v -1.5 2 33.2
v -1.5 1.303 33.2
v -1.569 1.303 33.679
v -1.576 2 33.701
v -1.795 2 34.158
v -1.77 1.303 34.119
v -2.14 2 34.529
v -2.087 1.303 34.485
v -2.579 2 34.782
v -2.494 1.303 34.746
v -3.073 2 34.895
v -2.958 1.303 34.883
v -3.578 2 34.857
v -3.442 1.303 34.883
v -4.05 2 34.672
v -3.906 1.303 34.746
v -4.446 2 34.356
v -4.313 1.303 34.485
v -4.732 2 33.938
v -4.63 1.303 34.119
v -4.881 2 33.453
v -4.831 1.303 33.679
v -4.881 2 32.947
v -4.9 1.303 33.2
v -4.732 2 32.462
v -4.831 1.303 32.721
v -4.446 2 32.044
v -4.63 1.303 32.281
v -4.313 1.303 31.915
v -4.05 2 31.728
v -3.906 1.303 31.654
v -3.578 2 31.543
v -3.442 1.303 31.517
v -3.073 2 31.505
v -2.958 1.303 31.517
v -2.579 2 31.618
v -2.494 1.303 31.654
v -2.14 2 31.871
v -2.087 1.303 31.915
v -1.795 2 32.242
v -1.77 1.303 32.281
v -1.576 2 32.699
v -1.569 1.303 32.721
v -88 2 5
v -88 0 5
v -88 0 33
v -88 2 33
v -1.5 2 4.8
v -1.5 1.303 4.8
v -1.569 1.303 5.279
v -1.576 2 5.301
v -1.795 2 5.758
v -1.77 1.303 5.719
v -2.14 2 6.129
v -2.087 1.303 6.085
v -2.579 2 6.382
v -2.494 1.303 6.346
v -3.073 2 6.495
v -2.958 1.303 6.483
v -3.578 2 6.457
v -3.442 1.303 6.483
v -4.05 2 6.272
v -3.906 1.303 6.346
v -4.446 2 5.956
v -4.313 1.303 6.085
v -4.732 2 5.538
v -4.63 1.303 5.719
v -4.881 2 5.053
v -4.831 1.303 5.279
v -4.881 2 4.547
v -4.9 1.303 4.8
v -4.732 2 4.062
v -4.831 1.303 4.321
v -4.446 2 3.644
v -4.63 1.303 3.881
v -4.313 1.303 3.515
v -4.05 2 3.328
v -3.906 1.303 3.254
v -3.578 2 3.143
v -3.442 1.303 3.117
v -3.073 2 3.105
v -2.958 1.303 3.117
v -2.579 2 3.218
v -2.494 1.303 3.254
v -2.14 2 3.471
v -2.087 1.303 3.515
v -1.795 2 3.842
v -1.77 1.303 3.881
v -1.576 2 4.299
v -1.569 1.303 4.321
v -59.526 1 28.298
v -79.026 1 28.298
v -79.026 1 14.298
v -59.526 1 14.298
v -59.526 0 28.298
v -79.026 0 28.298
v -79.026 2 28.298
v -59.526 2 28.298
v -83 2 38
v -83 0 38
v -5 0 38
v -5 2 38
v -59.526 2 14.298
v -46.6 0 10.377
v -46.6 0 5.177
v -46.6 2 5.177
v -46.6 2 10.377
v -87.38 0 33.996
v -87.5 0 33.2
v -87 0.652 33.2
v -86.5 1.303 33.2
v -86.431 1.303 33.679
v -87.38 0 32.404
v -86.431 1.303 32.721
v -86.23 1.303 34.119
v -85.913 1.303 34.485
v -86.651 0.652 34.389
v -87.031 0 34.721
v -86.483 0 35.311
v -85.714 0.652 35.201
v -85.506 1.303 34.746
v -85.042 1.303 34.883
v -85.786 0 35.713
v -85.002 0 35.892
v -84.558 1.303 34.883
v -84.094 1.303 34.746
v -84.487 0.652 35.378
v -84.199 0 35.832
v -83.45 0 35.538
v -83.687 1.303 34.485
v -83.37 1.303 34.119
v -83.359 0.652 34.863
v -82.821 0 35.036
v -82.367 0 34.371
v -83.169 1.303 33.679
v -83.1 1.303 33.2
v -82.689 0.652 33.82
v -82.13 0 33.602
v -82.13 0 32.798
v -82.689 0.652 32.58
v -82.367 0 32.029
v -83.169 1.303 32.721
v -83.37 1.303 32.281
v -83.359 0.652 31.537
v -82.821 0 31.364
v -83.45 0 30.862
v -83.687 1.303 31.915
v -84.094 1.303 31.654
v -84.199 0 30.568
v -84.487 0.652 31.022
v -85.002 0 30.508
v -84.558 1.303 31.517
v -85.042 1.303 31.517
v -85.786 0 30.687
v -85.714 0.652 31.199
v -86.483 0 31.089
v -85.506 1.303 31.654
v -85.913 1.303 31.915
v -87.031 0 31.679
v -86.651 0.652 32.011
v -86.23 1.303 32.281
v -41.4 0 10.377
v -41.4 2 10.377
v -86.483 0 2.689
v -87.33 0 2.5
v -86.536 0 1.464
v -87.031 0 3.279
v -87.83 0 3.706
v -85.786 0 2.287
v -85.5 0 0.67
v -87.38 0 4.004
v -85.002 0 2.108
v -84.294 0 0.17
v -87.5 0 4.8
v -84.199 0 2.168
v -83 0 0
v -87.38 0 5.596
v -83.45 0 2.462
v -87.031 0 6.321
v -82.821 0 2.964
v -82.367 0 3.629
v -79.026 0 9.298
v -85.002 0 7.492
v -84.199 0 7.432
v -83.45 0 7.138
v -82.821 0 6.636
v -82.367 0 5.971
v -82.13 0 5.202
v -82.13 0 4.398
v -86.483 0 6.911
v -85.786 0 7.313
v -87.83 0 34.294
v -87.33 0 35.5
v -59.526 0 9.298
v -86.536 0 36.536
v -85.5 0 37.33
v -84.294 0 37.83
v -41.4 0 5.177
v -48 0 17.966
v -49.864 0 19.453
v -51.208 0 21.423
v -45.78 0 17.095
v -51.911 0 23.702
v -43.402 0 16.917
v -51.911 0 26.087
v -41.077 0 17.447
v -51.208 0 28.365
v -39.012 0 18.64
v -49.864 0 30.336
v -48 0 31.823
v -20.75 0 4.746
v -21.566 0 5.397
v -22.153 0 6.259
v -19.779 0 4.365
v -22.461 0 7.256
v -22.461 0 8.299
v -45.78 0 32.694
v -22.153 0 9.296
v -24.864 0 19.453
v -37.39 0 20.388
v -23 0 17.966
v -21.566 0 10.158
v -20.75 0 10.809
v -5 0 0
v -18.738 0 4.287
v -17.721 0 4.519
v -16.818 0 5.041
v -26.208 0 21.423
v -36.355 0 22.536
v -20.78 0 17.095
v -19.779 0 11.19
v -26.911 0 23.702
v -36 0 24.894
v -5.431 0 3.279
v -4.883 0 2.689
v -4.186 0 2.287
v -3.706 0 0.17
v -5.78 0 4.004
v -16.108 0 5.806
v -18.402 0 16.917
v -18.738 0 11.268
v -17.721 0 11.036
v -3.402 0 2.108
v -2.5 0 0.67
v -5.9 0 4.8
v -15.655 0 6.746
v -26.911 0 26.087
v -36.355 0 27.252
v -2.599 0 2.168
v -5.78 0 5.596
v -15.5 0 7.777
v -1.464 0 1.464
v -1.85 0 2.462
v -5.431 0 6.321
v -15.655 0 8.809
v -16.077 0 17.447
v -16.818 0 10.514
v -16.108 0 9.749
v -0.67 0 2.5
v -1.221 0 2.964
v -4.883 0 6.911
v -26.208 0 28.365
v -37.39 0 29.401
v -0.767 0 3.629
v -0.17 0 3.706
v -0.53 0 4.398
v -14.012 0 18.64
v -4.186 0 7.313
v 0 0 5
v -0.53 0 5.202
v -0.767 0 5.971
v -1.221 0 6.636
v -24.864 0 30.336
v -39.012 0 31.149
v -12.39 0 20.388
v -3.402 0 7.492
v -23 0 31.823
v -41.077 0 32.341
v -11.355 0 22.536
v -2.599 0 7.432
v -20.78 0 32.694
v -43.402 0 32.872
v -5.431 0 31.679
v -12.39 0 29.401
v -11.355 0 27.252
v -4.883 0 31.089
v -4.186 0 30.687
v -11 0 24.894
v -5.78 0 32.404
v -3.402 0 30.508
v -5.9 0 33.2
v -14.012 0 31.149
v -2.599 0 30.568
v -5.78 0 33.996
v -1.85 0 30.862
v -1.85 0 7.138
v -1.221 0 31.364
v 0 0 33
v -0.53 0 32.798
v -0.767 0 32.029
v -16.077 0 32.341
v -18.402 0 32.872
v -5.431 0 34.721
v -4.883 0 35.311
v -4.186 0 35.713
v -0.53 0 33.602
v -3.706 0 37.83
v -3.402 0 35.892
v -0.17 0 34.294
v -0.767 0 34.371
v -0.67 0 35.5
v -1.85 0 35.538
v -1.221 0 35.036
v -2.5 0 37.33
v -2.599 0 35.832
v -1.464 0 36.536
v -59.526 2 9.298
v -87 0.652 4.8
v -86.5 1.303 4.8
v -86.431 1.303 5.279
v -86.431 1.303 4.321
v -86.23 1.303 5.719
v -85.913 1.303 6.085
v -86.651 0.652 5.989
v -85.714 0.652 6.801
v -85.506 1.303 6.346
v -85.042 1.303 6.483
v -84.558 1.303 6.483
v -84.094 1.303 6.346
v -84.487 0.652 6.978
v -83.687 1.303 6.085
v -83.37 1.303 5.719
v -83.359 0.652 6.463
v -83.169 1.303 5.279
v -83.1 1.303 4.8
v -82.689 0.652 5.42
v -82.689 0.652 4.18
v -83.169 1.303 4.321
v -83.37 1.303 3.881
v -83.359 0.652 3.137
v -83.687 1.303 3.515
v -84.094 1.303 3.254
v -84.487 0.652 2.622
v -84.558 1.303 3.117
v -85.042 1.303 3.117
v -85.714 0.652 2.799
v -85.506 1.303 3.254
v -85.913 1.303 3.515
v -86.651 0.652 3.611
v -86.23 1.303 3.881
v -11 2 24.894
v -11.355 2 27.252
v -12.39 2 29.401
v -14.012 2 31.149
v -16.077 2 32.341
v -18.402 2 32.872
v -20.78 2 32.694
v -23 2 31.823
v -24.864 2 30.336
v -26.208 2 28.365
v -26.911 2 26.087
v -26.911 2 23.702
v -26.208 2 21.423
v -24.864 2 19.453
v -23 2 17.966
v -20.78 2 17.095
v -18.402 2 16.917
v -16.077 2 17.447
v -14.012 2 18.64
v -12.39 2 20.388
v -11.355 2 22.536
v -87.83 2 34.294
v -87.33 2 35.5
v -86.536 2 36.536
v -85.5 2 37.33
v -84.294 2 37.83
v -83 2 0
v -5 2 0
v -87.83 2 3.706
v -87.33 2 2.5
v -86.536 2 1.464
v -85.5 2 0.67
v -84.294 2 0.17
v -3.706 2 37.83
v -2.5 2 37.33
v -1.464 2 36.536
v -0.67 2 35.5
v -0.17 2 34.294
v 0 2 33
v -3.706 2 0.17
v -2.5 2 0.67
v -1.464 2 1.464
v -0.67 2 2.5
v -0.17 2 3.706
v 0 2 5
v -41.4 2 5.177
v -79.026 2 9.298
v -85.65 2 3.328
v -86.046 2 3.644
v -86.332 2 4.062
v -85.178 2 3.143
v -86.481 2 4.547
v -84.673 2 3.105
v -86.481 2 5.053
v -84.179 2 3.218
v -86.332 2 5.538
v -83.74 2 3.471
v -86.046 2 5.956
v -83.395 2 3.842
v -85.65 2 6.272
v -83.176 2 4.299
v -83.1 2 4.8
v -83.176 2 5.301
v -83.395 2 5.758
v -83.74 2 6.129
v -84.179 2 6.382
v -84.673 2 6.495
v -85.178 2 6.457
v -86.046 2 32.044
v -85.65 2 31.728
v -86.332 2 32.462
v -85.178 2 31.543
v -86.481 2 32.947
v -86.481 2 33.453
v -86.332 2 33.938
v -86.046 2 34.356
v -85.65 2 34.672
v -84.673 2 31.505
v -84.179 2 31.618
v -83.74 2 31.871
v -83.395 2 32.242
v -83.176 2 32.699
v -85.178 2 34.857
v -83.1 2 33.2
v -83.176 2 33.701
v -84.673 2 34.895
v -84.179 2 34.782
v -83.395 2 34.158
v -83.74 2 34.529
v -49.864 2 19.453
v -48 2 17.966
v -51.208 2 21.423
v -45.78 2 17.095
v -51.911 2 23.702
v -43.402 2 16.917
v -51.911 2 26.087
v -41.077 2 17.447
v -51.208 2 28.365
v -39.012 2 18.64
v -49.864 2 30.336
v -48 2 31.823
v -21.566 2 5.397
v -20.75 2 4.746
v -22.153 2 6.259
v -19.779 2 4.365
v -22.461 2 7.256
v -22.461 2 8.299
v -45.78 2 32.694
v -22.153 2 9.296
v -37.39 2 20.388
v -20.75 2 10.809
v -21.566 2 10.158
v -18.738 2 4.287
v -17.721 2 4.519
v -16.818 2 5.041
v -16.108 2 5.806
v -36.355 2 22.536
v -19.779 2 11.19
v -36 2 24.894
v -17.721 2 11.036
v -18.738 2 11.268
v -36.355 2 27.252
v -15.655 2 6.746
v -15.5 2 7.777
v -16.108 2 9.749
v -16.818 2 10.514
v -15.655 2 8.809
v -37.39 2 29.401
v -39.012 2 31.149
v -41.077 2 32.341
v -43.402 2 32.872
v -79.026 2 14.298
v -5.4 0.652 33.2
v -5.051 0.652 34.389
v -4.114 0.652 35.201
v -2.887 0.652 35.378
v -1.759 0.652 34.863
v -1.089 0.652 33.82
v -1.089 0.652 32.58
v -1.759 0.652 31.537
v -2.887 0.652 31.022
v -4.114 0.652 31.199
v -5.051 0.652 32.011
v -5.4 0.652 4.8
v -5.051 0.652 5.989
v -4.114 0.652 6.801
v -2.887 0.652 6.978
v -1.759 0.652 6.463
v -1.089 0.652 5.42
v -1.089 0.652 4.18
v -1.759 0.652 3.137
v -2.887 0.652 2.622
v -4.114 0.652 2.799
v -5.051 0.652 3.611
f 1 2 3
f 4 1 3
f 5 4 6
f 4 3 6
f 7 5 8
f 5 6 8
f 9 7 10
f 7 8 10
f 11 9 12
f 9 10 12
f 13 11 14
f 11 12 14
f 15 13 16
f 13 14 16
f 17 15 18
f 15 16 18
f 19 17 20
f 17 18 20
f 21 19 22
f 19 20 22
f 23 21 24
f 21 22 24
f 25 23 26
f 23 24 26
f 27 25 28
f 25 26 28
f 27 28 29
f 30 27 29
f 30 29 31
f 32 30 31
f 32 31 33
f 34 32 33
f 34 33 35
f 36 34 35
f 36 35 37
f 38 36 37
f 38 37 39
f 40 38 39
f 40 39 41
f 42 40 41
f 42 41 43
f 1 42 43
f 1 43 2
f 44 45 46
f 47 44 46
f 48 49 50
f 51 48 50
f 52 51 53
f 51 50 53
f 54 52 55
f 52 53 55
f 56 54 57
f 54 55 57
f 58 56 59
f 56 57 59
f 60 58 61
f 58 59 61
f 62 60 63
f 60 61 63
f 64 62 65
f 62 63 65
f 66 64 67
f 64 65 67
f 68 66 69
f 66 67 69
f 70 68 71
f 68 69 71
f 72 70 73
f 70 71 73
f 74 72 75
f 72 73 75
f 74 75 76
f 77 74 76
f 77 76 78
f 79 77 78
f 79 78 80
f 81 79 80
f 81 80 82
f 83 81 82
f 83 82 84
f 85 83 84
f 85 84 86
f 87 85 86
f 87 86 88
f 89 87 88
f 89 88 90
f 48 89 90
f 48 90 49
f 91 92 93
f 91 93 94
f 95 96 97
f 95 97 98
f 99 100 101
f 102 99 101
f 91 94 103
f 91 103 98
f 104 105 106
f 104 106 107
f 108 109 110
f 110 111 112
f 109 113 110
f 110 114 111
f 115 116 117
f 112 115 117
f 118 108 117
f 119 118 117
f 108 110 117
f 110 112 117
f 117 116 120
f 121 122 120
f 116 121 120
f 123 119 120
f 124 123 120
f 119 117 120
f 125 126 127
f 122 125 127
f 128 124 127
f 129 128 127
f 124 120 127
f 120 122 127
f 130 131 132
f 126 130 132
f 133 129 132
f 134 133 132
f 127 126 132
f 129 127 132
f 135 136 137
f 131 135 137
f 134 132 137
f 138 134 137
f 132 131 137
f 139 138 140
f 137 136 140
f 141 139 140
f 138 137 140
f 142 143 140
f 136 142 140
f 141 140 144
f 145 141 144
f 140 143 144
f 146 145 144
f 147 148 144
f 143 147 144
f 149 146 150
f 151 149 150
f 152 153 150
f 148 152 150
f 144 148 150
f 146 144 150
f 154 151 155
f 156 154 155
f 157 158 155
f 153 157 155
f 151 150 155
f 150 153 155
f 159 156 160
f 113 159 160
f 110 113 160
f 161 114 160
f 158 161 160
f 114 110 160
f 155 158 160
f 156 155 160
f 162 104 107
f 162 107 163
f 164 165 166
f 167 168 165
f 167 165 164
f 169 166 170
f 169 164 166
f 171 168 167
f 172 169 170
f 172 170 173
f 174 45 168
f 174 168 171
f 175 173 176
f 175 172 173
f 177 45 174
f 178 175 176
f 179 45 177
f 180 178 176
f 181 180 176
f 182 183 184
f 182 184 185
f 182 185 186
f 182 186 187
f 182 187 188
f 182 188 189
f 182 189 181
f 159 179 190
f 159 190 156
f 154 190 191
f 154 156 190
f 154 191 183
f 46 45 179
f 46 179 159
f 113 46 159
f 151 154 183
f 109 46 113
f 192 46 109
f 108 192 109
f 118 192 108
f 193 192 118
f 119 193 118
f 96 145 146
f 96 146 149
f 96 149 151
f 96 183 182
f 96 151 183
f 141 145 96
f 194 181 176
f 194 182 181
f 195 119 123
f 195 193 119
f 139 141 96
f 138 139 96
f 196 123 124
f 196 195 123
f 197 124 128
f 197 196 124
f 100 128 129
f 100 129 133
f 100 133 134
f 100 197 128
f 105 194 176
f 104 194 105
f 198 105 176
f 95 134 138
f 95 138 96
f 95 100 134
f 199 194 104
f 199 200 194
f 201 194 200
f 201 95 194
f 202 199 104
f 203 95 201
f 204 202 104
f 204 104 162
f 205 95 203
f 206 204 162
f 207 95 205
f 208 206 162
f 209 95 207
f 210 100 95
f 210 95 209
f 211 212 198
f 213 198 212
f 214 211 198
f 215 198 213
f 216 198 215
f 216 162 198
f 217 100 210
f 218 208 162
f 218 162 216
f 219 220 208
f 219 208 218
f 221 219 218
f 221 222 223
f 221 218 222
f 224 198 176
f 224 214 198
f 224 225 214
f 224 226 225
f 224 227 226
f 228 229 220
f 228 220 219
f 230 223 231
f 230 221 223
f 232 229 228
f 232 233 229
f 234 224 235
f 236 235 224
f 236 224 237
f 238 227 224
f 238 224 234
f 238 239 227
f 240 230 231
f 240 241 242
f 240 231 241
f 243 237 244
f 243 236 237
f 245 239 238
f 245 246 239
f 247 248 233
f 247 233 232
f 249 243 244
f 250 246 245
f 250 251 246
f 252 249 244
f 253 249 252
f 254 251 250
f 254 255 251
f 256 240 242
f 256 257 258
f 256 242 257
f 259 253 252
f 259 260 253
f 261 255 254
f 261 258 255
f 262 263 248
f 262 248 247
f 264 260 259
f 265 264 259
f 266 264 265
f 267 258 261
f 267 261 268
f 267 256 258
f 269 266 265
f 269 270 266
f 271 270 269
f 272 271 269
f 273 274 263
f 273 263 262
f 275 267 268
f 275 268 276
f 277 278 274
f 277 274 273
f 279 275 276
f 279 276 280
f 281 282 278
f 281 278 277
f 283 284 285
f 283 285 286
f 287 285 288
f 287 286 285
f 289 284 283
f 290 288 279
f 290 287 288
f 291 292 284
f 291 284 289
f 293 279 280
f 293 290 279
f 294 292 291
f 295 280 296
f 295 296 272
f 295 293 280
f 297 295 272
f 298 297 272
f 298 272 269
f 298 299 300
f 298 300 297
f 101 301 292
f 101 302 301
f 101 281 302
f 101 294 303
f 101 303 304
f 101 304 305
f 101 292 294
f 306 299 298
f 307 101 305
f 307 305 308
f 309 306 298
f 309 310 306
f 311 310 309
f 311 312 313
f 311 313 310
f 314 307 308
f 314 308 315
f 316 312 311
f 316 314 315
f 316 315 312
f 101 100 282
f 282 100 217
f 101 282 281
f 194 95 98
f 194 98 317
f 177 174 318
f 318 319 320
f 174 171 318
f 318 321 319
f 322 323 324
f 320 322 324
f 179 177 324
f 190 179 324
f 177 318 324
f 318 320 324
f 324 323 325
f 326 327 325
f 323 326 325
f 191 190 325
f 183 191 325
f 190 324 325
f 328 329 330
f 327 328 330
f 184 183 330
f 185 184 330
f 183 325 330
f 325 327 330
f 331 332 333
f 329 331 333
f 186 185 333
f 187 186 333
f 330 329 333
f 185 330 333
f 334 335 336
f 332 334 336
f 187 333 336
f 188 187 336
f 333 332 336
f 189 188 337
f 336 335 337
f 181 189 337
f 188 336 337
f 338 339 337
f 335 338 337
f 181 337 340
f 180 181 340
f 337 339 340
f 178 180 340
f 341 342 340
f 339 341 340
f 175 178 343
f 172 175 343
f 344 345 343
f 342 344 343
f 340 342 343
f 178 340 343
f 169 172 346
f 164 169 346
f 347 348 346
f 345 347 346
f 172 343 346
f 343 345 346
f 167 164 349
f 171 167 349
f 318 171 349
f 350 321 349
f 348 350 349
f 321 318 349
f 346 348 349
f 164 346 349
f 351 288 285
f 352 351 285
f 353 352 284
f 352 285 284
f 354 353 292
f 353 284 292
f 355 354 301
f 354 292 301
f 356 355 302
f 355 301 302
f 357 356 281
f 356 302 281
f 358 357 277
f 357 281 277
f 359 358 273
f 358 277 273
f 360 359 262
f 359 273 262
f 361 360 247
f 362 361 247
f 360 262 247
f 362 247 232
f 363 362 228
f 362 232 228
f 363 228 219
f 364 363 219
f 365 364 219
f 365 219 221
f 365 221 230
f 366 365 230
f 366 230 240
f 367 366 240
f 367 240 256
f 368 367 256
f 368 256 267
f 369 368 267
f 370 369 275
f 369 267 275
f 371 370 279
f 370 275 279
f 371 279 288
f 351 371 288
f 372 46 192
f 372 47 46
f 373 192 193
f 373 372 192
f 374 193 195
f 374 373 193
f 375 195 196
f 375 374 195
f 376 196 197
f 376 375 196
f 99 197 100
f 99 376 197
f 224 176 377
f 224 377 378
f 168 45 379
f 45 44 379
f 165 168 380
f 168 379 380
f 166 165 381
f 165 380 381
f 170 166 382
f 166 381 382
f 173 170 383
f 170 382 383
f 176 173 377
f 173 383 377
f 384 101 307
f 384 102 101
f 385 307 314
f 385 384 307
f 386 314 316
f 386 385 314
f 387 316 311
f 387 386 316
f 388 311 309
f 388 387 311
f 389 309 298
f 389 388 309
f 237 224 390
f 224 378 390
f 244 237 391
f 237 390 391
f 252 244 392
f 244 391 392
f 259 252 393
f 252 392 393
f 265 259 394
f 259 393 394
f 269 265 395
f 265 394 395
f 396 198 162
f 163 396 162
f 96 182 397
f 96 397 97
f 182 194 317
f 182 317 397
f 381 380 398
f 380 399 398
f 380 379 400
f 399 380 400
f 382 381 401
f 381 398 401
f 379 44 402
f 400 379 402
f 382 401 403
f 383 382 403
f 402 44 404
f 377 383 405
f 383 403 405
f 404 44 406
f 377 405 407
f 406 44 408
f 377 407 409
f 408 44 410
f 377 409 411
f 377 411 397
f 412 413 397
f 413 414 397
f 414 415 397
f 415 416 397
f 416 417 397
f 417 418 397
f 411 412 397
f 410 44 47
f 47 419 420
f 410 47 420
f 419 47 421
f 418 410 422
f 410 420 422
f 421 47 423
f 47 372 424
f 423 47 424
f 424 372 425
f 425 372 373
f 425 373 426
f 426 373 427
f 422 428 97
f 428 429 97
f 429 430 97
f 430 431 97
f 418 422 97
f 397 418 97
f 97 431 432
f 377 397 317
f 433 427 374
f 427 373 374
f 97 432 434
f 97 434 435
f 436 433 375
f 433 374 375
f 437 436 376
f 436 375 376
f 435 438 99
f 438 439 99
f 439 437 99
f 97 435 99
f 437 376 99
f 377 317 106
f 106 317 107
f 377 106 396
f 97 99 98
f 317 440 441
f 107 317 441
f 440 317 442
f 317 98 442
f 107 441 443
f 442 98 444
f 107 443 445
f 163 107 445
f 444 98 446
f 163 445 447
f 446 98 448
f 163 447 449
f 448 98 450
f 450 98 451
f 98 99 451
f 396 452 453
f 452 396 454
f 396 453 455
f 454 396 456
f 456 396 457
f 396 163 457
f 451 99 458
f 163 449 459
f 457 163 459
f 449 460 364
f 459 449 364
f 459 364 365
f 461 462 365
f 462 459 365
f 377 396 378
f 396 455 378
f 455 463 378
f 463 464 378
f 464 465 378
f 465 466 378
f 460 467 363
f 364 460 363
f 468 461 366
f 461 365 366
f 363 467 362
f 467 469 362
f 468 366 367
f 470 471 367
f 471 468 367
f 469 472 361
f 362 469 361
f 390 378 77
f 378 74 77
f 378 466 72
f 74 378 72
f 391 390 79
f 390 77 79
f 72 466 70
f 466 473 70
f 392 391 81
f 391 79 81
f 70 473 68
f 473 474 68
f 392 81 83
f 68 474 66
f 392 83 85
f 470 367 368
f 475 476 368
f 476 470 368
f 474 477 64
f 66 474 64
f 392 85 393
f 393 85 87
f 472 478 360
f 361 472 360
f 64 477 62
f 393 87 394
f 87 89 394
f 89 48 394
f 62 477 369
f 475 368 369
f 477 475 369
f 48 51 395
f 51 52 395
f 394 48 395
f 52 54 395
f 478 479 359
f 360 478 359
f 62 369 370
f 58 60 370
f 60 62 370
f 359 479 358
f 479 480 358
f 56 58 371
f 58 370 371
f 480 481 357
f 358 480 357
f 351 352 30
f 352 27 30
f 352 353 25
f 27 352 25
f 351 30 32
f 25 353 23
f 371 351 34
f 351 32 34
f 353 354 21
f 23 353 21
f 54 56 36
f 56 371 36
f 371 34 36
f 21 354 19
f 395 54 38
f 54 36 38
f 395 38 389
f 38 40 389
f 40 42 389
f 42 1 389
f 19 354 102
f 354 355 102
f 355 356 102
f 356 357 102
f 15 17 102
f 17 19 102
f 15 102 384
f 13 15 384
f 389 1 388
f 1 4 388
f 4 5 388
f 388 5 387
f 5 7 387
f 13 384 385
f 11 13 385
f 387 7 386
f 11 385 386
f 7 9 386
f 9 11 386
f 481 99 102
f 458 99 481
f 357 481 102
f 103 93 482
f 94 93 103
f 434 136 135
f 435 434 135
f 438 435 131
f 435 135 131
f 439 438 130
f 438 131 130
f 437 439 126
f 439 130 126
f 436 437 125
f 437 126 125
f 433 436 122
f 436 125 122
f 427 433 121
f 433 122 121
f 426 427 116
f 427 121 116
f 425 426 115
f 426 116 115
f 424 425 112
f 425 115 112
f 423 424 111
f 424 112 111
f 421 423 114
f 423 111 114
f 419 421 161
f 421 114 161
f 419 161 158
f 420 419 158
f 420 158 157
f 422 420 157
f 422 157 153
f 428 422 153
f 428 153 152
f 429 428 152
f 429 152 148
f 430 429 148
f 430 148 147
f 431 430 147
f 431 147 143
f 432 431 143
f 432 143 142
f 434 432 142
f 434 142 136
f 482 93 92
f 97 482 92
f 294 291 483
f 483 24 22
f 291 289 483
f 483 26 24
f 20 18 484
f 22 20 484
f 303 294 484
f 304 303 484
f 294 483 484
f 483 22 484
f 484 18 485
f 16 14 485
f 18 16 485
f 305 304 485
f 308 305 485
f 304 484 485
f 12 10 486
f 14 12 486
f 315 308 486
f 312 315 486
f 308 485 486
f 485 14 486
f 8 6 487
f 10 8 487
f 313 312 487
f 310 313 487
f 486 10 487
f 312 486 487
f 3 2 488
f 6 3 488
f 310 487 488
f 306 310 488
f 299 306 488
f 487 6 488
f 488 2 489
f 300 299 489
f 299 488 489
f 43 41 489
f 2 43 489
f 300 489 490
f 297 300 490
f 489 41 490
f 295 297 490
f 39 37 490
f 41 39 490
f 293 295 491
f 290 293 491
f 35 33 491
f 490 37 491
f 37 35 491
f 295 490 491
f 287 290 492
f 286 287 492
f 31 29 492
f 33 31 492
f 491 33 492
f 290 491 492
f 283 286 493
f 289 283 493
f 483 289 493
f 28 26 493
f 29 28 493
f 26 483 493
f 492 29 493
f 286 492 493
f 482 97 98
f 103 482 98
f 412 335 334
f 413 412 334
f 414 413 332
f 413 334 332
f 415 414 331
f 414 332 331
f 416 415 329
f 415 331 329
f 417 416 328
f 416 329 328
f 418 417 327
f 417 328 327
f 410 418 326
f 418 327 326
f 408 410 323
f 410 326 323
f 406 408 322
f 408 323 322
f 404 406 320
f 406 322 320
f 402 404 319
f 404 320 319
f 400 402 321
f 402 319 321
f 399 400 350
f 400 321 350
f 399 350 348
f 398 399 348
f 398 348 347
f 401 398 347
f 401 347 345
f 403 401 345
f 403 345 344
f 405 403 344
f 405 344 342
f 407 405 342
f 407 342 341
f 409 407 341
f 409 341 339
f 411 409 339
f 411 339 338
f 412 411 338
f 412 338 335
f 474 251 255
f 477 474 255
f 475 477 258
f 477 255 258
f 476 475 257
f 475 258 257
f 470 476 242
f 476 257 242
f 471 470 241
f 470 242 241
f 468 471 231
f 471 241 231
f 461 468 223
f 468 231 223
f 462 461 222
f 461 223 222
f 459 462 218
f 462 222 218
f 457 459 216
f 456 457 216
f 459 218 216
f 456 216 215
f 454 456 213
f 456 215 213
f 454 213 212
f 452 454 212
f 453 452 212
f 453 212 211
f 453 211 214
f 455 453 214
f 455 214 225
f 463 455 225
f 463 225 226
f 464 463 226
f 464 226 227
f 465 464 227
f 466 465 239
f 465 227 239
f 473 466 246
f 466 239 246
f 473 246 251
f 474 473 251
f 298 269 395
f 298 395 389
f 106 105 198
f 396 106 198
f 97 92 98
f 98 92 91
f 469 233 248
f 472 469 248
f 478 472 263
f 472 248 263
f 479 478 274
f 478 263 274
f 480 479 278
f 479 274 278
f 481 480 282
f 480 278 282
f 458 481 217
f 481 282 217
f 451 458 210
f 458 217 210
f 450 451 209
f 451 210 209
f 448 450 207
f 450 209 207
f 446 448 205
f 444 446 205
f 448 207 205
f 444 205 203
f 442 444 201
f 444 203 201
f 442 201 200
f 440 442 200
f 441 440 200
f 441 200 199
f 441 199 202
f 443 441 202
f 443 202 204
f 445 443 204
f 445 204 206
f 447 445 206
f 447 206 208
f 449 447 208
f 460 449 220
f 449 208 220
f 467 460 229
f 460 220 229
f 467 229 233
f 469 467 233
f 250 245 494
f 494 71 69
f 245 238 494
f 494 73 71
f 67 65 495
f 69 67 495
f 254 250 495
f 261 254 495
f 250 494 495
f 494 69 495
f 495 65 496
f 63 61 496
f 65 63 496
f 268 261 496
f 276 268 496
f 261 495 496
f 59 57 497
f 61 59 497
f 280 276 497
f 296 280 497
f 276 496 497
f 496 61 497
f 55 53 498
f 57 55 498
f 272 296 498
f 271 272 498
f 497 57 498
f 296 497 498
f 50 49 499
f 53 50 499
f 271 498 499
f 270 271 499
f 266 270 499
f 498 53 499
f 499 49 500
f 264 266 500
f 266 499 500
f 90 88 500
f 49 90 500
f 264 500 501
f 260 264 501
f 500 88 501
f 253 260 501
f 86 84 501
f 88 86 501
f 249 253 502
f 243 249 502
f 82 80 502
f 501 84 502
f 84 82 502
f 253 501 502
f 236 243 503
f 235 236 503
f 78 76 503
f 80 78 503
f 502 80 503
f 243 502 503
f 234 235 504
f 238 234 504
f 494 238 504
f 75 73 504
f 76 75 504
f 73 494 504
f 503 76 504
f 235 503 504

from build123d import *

# Parameters (mm, degrees)
F0_W           = 88
F0_H           = 38
F0_R           = 1.7
F0_W_2         = 5.2
F0_H_2         = 5.2
F0_R_2         = 3.5
F0_R_3         = 8
F1_DEPTH       = 2
F2_R           = 5
F3_D           = 3
F3_DEPTH       = 13.5
F3_CSINK_D     = 5.4
F3_CSINK_ANGLE = 75
F0_W_3         = 19.5
F0_H_3         = 14
F4_DEPTH       = 2
F5_DEPTH       = 1


with BuildPart() as f1:
    # F0 (on Front) → F1 (new body)
    with BuildSketch(Plane.XZ):
        with Locations((-44, 19)):
            Rectangle(F0_W, F0_H)
        with Locations((-84.8, 4.8)):
            Circle(F0_R, mode=Mode.SUBTRACT)
        Polygon((-79.026386, 14.297835), (-79.026386, 28.297835), (-59.526386, 28.297835), (-59.526386, 14.297835), (-59.526386, 9.297835), (-79.026386, 9.297835), align=None, mode=Mode.SUBTRACT)
        with Locations((-44, 7.777472)):
            Rectangle(F0_W_2, F0_H_2, mode=Mode.SUBTRACT)
        with Locations((-19, 7.777472)):
            Circle(F0_R_2, mode=Mode.SUBTRACT)
        with Locations((-3.2, 4.8)):
            Circle(F0_R, mode=Mode.SUBTRACT)
        with Locations((-84.8, 33.2)):
            Circle(F0_R, mode=Mode.SUBTRACT)
        with Locations((-44, 24.894385)):
            Circle(F0_R_3, mode=Mode.SUBTRACT)
        with Locations((-19, 24.894385)):
            Circle(F0_R_3, mode=Mode.SUBTRACT)
        with Locations((-3.2, 33.2)):
            Circle(F0_R, mode=Mode.SUBTRACT)
    extrude(amount=-F1_DEPTH)

    # F2
    f2_edges = [f1.edges().sort_by_distance(p)[0] for p in [
        (-88, 1, 38),
        (-88, 1, 0),
        (0, 1, 0),
        (0, 1, 38),
    ]]
    fillet(f2_edges, radius=F2_R)

    # F3
    with Locations(Plane.XZ):
        with Locations((-84.8, 4.8), (-84.8, 33.2), (-3.2, 4.8), (-3.2, 33.2)):
            CounterSinkHole(F3_D / 2, F3_CSINK_D / 2, depth=F3_DEPTH, counter_sink_angle=F3_CSINK_ANGLE)


with BuildPart() as f4:
    # F0 (on Front) → F4 (new body)
    with BuildSketch(Plane.XZ):
        with Locations((-69.276386, 21.297835)):
            Rectangle(F0_W_3, F0_H_3)
    extrude(amount=-F4_DEPTH)

    # F0 (on Front) → F5 (cut)
    with BuildSketch(Plane.XZ):
        with Locations((-69.276386, 21.297835)):
            Rectangle(F0_W_3, F0_H_3)
    extrude(amount=-F5_DEPTH, mode=Mode.SUBTRACT)


solid = Compound([f1.part, f4.part])
